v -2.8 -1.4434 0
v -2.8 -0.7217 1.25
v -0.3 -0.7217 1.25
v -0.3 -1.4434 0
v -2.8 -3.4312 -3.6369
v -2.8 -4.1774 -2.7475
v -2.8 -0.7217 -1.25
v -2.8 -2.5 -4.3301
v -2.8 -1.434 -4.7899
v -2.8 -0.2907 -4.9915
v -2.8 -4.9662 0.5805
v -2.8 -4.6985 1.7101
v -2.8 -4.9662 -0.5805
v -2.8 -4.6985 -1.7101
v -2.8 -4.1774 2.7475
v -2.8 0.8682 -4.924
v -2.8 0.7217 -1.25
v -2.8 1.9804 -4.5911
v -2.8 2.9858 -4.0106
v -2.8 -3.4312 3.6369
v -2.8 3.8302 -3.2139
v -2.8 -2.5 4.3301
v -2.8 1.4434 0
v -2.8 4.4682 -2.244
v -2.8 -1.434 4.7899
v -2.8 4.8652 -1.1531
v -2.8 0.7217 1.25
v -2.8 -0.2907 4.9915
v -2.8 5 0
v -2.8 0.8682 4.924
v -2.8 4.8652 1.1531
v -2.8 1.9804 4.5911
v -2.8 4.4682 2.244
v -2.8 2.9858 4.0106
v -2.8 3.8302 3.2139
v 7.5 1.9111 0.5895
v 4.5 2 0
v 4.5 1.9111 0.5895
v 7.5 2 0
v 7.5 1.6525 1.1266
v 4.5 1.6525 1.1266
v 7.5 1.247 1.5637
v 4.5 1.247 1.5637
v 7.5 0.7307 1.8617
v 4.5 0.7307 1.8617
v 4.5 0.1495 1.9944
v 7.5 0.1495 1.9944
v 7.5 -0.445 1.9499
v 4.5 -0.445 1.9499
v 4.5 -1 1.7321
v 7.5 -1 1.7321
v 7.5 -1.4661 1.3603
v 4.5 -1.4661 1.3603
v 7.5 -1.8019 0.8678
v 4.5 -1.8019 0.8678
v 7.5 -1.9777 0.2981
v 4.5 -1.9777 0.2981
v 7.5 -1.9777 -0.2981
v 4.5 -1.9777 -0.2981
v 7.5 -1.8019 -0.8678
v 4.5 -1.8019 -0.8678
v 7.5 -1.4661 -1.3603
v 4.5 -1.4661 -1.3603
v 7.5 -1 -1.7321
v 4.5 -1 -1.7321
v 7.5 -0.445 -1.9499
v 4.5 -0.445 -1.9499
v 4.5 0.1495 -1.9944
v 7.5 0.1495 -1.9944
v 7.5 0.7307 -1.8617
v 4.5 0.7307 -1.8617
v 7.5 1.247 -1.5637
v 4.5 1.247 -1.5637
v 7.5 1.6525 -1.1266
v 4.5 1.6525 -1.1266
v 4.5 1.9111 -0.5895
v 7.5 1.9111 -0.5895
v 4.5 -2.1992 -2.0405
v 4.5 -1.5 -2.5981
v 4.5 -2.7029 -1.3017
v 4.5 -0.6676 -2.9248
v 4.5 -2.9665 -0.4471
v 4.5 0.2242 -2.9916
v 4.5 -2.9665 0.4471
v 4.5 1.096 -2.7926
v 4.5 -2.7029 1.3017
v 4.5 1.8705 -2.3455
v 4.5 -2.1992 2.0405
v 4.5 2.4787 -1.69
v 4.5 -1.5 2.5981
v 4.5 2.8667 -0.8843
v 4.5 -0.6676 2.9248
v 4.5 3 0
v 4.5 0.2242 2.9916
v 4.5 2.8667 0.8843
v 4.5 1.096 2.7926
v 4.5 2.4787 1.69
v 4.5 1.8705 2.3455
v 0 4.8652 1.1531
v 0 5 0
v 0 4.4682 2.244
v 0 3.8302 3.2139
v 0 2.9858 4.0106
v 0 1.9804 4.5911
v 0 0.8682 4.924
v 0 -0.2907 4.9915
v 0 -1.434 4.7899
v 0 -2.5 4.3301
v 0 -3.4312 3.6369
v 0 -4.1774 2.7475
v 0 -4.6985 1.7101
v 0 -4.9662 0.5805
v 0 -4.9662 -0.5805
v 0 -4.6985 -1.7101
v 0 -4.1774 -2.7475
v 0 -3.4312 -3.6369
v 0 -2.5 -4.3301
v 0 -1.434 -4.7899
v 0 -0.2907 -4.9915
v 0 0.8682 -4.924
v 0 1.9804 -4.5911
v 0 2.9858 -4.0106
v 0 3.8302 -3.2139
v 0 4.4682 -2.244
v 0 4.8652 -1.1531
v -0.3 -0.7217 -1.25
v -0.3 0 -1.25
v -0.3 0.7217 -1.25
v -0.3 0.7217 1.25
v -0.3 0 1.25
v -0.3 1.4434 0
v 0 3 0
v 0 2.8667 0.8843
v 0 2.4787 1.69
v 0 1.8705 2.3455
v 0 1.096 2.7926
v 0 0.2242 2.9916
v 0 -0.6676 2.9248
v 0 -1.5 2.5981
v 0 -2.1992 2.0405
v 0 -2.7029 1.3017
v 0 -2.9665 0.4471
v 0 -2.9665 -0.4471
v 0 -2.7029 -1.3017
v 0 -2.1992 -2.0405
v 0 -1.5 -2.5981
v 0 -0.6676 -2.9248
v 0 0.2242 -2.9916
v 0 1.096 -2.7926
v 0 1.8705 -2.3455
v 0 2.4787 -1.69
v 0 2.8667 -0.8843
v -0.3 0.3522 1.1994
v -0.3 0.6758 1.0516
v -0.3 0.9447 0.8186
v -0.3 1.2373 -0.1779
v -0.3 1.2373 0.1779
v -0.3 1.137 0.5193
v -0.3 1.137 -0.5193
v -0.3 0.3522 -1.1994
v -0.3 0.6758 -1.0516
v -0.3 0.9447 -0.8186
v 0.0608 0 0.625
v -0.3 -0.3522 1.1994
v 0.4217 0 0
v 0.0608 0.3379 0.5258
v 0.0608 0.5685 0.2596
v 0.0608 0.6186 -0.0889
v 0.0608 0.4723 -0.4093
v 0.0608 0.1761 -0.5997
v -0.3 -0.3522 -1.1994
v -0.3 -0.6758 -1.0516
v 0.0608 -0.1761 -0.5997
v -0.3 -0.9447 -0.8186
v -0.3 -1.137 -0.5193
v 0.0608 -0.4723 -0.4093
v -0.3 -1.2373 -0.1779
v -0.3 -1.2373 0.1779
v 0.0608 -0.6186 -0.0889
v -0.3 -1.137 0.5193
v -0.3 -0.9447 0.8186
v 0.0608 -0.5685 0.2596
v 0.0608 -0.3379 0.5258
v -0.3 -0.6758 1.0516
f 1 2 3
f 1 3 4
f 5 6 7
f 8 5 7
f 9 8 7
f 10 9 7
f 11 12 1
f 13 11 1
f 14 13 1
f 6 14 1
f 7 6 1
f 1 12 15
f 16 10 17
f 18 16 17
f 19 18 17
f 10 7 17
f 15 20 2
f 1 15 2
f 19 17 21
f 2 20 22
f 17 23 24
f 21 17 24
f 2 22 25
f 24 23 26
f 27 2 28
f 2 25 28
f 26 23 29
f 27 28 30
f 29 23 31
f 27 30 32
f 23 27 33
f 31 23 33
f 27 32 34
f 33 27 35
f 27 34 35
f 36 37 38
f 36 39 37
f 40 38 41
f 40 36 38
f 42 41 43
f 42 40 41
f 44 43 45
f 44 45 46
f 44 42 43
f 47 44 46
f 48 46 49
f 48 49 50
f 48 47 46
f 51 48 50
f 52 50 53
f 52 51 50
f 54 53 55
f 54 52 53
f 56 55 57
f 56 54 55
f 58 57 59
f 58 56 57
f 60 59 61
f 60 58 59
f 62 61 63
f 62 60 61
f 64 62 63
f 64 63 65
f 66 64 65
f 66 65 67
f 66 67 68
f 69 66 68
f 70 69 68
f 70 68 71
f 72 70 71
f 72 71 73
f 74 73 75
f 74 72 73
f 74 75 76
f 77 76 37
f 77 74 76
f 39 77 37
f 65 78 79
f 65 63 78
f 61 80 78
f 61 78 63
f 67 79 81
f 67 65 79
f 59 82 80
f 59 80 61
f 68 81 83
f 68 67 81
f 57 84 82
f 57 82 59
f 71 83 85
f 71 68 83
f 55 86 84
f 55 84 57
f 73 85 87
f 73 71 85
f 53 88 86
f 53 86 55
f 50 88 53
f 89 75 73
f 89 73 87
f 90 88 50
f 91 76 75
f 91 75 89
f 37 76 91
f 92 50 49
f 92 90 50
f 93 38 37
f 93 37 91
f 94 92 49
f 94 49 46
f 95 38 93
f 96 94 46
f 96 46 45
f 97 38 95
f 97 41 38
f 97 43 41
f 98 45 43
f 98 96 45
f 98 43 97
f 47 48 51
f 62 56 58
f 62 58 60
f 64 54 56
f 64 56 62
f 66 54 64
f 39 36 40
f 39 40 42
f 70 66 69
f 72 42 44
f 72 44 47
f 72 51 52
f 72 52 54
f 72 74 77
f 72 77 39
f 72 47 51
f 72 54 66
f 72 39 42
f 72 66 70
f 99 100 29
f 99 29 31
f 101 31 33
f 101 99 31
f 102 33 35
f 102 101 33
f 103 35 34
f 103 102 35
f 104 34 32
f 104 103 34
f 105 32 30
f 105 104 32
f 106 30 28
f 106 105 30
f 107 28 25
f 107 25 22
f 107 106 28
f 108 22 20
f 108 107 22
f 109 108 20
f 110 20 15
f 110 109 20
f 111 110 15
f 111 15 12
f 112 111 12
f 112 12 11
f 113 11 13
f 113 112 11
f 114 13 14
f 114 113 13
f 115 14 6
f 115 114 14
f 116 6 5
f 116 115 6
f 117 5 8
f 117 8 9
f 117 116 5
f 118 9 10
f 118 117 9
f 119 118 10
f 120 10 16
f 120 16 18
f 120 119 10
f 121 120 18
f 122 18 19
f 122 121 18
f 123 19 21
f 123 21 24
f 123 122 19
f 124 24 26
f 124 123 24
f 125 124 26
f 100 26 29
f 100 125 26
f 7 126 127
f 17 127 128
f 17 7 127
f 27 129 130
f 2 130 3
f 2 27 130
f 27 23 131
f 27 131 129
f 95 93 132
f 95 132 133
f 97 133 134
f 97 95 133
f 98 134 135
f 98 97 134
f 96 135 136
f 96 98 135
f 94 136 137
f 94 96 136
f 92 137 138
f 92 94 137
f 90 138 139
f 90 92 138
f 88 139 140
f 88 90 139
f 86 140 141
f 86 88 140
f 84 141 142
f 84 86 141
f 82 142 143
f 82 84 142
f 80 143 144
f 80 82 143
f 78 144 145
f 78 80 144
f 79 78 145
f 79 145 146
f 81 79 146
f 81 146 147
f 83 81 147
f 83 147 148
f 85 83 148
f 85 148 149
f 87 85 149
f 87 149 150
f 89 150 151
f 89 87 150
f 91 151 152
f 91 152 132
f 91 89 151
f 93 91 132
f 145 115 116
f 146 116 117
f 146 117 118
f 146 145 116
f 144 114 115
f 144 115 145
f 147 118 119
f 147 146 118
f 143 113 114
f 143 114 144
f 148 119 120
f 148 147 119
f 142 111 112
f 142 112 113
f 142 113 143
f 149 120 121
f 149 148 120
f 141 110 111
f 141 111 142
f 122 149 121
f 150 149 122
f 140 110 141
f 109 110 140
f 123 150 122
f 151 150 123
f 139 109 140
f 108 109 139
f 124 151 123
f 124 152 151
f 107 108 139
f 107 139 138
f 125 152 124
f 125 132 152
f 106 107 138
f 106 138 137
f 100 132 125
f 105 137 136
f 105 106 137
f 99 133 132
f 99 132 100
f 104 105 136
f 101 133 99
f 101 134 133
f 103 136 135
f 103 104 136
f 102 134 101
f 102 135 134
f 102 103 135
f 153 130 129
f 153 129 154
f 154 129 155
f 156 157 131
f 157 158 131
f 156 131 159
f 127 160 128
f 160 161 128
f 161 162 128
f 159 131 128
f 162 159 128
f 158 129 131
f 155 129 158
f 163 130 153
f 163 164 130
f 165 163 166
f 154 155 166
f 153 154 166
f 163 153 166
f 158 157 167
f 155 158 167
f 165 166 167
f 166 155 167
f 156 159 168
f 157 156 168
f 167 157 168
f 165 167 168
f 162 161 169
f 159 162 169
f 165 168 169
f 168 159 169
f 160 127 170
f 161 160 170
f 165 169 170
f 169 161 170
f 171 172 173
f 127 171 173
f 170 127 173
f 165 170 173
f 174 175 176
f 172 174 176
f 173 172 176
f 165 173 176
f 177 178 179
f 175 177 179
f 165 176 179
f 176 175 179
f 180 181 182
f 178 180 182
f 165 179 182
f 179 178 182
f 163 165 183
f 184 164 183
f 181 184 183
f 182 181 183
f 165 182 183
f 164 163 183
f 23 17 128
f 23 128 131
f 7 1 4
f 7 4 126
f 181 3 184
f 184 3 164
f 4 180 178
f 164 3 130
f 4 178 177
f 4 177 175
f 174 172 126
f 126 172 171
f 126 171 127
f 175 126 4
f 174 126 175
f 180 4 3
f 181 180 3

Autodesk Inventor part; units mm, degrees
ref_plane "YZ Plane" through (0, 0, 0) normal (1, 0, 0) x (0, 1, 0)
ref_plane "XZ Plane" through (0, 0, 0) normal (0, 1, 0) x (-1, 0, 0)
ref_plane "XY Plane" through (0, 0, 0) normal (0, 0, 1) x (1, 0, 0)
sketch "Sketch_1" plane through (0, 0, 0) normal (0, 0, 1) x (1, 0, 0)
  line L0 (4.5, 0) -> (-2.8, 0)
  line L1 (-2.8, 0) -> (-2.8, 5)
  line L2 (-2.8, 5) -> (0, 5)
  line L3 (0, 5) -> (0, 3)
  line L4 (0, 3) -> (4.5, 3)
  line L5 (4.5, 3) -> (4.5, 0)
  line L6 (4.5, 0) -> (-2.8, 0)
revolve "Revolution1" add sketch "Sketch_1" angle 360 about axis through (4.5, 0, 0) along (1, 0, 0)
sketch "Sketch2" plane through (-2.8, 0, 0) normal (-1, 0, 0) x (0, 0, 1)
  point P0 (0, 0)
hole "Hole1" at (-2.8, 0, 0) direction (1, 0, 0) diameter 2.5 depth 2.5 tip angle 120
sketch "Sketch_3" plane through (-2.8, 0, 0) normal (1, 0, 0) x (0, 0, -1)
  line L0 (-1.25, -0.7217) -> (0, -1.4434)
  line L1 (0, -1.4434) -> (1.25, -0.7217)
  line L2 (1.25, -0.7217) -> (1.25, 0.7217)
  line L3 (1.25, 0.7217) -> (0, 1.4434)
  line L4 (0, 1.4434) -> (-1.25, 0.7217)
  line L5 (-1.25, 0.7217) -> (-1.25, -0.7217)
extrude "Extrusion1" cut sketch "Sketch_3" along normal blind 2.5
sketch "Sketch_6" plane through (0, 0, 0) normal (0, 0, 1) x (1, 0, 0)
  line L0 (9.5, 0) -> (4.5, 0)
  line L1 (4.5, 0) -> (4.5, 2)
  line L2 (4.5, 2) -> (9.0705, 2)
  line L3 (9.0705, 2) -> (9.5, 1.5705)
  line L4 (9.5, 1.5705) -> (9.5, 0)
  line L5 (9.5, 0) -> (4.5, 0)
revolve "Revolution2" add sketch "Sketch_6" angle 360 about axis through (9.5, 0, 0) along (1, 0, 0)
thread "Thread1" size "M4x0.7" class "6g" standard "ISO Metric profile" length 3.3705
sketch "スケッチ5" plane through (9.5, 0, 0) normal (1, 0, 0) x (0, 0, -1)
  circle A0 centre (0, 0) radius 5
extrude "押し出し2" cut sketch "スケッチ5" against normal blind 2
properties part number "DBTS4-4_5-5-LTC_mod"
